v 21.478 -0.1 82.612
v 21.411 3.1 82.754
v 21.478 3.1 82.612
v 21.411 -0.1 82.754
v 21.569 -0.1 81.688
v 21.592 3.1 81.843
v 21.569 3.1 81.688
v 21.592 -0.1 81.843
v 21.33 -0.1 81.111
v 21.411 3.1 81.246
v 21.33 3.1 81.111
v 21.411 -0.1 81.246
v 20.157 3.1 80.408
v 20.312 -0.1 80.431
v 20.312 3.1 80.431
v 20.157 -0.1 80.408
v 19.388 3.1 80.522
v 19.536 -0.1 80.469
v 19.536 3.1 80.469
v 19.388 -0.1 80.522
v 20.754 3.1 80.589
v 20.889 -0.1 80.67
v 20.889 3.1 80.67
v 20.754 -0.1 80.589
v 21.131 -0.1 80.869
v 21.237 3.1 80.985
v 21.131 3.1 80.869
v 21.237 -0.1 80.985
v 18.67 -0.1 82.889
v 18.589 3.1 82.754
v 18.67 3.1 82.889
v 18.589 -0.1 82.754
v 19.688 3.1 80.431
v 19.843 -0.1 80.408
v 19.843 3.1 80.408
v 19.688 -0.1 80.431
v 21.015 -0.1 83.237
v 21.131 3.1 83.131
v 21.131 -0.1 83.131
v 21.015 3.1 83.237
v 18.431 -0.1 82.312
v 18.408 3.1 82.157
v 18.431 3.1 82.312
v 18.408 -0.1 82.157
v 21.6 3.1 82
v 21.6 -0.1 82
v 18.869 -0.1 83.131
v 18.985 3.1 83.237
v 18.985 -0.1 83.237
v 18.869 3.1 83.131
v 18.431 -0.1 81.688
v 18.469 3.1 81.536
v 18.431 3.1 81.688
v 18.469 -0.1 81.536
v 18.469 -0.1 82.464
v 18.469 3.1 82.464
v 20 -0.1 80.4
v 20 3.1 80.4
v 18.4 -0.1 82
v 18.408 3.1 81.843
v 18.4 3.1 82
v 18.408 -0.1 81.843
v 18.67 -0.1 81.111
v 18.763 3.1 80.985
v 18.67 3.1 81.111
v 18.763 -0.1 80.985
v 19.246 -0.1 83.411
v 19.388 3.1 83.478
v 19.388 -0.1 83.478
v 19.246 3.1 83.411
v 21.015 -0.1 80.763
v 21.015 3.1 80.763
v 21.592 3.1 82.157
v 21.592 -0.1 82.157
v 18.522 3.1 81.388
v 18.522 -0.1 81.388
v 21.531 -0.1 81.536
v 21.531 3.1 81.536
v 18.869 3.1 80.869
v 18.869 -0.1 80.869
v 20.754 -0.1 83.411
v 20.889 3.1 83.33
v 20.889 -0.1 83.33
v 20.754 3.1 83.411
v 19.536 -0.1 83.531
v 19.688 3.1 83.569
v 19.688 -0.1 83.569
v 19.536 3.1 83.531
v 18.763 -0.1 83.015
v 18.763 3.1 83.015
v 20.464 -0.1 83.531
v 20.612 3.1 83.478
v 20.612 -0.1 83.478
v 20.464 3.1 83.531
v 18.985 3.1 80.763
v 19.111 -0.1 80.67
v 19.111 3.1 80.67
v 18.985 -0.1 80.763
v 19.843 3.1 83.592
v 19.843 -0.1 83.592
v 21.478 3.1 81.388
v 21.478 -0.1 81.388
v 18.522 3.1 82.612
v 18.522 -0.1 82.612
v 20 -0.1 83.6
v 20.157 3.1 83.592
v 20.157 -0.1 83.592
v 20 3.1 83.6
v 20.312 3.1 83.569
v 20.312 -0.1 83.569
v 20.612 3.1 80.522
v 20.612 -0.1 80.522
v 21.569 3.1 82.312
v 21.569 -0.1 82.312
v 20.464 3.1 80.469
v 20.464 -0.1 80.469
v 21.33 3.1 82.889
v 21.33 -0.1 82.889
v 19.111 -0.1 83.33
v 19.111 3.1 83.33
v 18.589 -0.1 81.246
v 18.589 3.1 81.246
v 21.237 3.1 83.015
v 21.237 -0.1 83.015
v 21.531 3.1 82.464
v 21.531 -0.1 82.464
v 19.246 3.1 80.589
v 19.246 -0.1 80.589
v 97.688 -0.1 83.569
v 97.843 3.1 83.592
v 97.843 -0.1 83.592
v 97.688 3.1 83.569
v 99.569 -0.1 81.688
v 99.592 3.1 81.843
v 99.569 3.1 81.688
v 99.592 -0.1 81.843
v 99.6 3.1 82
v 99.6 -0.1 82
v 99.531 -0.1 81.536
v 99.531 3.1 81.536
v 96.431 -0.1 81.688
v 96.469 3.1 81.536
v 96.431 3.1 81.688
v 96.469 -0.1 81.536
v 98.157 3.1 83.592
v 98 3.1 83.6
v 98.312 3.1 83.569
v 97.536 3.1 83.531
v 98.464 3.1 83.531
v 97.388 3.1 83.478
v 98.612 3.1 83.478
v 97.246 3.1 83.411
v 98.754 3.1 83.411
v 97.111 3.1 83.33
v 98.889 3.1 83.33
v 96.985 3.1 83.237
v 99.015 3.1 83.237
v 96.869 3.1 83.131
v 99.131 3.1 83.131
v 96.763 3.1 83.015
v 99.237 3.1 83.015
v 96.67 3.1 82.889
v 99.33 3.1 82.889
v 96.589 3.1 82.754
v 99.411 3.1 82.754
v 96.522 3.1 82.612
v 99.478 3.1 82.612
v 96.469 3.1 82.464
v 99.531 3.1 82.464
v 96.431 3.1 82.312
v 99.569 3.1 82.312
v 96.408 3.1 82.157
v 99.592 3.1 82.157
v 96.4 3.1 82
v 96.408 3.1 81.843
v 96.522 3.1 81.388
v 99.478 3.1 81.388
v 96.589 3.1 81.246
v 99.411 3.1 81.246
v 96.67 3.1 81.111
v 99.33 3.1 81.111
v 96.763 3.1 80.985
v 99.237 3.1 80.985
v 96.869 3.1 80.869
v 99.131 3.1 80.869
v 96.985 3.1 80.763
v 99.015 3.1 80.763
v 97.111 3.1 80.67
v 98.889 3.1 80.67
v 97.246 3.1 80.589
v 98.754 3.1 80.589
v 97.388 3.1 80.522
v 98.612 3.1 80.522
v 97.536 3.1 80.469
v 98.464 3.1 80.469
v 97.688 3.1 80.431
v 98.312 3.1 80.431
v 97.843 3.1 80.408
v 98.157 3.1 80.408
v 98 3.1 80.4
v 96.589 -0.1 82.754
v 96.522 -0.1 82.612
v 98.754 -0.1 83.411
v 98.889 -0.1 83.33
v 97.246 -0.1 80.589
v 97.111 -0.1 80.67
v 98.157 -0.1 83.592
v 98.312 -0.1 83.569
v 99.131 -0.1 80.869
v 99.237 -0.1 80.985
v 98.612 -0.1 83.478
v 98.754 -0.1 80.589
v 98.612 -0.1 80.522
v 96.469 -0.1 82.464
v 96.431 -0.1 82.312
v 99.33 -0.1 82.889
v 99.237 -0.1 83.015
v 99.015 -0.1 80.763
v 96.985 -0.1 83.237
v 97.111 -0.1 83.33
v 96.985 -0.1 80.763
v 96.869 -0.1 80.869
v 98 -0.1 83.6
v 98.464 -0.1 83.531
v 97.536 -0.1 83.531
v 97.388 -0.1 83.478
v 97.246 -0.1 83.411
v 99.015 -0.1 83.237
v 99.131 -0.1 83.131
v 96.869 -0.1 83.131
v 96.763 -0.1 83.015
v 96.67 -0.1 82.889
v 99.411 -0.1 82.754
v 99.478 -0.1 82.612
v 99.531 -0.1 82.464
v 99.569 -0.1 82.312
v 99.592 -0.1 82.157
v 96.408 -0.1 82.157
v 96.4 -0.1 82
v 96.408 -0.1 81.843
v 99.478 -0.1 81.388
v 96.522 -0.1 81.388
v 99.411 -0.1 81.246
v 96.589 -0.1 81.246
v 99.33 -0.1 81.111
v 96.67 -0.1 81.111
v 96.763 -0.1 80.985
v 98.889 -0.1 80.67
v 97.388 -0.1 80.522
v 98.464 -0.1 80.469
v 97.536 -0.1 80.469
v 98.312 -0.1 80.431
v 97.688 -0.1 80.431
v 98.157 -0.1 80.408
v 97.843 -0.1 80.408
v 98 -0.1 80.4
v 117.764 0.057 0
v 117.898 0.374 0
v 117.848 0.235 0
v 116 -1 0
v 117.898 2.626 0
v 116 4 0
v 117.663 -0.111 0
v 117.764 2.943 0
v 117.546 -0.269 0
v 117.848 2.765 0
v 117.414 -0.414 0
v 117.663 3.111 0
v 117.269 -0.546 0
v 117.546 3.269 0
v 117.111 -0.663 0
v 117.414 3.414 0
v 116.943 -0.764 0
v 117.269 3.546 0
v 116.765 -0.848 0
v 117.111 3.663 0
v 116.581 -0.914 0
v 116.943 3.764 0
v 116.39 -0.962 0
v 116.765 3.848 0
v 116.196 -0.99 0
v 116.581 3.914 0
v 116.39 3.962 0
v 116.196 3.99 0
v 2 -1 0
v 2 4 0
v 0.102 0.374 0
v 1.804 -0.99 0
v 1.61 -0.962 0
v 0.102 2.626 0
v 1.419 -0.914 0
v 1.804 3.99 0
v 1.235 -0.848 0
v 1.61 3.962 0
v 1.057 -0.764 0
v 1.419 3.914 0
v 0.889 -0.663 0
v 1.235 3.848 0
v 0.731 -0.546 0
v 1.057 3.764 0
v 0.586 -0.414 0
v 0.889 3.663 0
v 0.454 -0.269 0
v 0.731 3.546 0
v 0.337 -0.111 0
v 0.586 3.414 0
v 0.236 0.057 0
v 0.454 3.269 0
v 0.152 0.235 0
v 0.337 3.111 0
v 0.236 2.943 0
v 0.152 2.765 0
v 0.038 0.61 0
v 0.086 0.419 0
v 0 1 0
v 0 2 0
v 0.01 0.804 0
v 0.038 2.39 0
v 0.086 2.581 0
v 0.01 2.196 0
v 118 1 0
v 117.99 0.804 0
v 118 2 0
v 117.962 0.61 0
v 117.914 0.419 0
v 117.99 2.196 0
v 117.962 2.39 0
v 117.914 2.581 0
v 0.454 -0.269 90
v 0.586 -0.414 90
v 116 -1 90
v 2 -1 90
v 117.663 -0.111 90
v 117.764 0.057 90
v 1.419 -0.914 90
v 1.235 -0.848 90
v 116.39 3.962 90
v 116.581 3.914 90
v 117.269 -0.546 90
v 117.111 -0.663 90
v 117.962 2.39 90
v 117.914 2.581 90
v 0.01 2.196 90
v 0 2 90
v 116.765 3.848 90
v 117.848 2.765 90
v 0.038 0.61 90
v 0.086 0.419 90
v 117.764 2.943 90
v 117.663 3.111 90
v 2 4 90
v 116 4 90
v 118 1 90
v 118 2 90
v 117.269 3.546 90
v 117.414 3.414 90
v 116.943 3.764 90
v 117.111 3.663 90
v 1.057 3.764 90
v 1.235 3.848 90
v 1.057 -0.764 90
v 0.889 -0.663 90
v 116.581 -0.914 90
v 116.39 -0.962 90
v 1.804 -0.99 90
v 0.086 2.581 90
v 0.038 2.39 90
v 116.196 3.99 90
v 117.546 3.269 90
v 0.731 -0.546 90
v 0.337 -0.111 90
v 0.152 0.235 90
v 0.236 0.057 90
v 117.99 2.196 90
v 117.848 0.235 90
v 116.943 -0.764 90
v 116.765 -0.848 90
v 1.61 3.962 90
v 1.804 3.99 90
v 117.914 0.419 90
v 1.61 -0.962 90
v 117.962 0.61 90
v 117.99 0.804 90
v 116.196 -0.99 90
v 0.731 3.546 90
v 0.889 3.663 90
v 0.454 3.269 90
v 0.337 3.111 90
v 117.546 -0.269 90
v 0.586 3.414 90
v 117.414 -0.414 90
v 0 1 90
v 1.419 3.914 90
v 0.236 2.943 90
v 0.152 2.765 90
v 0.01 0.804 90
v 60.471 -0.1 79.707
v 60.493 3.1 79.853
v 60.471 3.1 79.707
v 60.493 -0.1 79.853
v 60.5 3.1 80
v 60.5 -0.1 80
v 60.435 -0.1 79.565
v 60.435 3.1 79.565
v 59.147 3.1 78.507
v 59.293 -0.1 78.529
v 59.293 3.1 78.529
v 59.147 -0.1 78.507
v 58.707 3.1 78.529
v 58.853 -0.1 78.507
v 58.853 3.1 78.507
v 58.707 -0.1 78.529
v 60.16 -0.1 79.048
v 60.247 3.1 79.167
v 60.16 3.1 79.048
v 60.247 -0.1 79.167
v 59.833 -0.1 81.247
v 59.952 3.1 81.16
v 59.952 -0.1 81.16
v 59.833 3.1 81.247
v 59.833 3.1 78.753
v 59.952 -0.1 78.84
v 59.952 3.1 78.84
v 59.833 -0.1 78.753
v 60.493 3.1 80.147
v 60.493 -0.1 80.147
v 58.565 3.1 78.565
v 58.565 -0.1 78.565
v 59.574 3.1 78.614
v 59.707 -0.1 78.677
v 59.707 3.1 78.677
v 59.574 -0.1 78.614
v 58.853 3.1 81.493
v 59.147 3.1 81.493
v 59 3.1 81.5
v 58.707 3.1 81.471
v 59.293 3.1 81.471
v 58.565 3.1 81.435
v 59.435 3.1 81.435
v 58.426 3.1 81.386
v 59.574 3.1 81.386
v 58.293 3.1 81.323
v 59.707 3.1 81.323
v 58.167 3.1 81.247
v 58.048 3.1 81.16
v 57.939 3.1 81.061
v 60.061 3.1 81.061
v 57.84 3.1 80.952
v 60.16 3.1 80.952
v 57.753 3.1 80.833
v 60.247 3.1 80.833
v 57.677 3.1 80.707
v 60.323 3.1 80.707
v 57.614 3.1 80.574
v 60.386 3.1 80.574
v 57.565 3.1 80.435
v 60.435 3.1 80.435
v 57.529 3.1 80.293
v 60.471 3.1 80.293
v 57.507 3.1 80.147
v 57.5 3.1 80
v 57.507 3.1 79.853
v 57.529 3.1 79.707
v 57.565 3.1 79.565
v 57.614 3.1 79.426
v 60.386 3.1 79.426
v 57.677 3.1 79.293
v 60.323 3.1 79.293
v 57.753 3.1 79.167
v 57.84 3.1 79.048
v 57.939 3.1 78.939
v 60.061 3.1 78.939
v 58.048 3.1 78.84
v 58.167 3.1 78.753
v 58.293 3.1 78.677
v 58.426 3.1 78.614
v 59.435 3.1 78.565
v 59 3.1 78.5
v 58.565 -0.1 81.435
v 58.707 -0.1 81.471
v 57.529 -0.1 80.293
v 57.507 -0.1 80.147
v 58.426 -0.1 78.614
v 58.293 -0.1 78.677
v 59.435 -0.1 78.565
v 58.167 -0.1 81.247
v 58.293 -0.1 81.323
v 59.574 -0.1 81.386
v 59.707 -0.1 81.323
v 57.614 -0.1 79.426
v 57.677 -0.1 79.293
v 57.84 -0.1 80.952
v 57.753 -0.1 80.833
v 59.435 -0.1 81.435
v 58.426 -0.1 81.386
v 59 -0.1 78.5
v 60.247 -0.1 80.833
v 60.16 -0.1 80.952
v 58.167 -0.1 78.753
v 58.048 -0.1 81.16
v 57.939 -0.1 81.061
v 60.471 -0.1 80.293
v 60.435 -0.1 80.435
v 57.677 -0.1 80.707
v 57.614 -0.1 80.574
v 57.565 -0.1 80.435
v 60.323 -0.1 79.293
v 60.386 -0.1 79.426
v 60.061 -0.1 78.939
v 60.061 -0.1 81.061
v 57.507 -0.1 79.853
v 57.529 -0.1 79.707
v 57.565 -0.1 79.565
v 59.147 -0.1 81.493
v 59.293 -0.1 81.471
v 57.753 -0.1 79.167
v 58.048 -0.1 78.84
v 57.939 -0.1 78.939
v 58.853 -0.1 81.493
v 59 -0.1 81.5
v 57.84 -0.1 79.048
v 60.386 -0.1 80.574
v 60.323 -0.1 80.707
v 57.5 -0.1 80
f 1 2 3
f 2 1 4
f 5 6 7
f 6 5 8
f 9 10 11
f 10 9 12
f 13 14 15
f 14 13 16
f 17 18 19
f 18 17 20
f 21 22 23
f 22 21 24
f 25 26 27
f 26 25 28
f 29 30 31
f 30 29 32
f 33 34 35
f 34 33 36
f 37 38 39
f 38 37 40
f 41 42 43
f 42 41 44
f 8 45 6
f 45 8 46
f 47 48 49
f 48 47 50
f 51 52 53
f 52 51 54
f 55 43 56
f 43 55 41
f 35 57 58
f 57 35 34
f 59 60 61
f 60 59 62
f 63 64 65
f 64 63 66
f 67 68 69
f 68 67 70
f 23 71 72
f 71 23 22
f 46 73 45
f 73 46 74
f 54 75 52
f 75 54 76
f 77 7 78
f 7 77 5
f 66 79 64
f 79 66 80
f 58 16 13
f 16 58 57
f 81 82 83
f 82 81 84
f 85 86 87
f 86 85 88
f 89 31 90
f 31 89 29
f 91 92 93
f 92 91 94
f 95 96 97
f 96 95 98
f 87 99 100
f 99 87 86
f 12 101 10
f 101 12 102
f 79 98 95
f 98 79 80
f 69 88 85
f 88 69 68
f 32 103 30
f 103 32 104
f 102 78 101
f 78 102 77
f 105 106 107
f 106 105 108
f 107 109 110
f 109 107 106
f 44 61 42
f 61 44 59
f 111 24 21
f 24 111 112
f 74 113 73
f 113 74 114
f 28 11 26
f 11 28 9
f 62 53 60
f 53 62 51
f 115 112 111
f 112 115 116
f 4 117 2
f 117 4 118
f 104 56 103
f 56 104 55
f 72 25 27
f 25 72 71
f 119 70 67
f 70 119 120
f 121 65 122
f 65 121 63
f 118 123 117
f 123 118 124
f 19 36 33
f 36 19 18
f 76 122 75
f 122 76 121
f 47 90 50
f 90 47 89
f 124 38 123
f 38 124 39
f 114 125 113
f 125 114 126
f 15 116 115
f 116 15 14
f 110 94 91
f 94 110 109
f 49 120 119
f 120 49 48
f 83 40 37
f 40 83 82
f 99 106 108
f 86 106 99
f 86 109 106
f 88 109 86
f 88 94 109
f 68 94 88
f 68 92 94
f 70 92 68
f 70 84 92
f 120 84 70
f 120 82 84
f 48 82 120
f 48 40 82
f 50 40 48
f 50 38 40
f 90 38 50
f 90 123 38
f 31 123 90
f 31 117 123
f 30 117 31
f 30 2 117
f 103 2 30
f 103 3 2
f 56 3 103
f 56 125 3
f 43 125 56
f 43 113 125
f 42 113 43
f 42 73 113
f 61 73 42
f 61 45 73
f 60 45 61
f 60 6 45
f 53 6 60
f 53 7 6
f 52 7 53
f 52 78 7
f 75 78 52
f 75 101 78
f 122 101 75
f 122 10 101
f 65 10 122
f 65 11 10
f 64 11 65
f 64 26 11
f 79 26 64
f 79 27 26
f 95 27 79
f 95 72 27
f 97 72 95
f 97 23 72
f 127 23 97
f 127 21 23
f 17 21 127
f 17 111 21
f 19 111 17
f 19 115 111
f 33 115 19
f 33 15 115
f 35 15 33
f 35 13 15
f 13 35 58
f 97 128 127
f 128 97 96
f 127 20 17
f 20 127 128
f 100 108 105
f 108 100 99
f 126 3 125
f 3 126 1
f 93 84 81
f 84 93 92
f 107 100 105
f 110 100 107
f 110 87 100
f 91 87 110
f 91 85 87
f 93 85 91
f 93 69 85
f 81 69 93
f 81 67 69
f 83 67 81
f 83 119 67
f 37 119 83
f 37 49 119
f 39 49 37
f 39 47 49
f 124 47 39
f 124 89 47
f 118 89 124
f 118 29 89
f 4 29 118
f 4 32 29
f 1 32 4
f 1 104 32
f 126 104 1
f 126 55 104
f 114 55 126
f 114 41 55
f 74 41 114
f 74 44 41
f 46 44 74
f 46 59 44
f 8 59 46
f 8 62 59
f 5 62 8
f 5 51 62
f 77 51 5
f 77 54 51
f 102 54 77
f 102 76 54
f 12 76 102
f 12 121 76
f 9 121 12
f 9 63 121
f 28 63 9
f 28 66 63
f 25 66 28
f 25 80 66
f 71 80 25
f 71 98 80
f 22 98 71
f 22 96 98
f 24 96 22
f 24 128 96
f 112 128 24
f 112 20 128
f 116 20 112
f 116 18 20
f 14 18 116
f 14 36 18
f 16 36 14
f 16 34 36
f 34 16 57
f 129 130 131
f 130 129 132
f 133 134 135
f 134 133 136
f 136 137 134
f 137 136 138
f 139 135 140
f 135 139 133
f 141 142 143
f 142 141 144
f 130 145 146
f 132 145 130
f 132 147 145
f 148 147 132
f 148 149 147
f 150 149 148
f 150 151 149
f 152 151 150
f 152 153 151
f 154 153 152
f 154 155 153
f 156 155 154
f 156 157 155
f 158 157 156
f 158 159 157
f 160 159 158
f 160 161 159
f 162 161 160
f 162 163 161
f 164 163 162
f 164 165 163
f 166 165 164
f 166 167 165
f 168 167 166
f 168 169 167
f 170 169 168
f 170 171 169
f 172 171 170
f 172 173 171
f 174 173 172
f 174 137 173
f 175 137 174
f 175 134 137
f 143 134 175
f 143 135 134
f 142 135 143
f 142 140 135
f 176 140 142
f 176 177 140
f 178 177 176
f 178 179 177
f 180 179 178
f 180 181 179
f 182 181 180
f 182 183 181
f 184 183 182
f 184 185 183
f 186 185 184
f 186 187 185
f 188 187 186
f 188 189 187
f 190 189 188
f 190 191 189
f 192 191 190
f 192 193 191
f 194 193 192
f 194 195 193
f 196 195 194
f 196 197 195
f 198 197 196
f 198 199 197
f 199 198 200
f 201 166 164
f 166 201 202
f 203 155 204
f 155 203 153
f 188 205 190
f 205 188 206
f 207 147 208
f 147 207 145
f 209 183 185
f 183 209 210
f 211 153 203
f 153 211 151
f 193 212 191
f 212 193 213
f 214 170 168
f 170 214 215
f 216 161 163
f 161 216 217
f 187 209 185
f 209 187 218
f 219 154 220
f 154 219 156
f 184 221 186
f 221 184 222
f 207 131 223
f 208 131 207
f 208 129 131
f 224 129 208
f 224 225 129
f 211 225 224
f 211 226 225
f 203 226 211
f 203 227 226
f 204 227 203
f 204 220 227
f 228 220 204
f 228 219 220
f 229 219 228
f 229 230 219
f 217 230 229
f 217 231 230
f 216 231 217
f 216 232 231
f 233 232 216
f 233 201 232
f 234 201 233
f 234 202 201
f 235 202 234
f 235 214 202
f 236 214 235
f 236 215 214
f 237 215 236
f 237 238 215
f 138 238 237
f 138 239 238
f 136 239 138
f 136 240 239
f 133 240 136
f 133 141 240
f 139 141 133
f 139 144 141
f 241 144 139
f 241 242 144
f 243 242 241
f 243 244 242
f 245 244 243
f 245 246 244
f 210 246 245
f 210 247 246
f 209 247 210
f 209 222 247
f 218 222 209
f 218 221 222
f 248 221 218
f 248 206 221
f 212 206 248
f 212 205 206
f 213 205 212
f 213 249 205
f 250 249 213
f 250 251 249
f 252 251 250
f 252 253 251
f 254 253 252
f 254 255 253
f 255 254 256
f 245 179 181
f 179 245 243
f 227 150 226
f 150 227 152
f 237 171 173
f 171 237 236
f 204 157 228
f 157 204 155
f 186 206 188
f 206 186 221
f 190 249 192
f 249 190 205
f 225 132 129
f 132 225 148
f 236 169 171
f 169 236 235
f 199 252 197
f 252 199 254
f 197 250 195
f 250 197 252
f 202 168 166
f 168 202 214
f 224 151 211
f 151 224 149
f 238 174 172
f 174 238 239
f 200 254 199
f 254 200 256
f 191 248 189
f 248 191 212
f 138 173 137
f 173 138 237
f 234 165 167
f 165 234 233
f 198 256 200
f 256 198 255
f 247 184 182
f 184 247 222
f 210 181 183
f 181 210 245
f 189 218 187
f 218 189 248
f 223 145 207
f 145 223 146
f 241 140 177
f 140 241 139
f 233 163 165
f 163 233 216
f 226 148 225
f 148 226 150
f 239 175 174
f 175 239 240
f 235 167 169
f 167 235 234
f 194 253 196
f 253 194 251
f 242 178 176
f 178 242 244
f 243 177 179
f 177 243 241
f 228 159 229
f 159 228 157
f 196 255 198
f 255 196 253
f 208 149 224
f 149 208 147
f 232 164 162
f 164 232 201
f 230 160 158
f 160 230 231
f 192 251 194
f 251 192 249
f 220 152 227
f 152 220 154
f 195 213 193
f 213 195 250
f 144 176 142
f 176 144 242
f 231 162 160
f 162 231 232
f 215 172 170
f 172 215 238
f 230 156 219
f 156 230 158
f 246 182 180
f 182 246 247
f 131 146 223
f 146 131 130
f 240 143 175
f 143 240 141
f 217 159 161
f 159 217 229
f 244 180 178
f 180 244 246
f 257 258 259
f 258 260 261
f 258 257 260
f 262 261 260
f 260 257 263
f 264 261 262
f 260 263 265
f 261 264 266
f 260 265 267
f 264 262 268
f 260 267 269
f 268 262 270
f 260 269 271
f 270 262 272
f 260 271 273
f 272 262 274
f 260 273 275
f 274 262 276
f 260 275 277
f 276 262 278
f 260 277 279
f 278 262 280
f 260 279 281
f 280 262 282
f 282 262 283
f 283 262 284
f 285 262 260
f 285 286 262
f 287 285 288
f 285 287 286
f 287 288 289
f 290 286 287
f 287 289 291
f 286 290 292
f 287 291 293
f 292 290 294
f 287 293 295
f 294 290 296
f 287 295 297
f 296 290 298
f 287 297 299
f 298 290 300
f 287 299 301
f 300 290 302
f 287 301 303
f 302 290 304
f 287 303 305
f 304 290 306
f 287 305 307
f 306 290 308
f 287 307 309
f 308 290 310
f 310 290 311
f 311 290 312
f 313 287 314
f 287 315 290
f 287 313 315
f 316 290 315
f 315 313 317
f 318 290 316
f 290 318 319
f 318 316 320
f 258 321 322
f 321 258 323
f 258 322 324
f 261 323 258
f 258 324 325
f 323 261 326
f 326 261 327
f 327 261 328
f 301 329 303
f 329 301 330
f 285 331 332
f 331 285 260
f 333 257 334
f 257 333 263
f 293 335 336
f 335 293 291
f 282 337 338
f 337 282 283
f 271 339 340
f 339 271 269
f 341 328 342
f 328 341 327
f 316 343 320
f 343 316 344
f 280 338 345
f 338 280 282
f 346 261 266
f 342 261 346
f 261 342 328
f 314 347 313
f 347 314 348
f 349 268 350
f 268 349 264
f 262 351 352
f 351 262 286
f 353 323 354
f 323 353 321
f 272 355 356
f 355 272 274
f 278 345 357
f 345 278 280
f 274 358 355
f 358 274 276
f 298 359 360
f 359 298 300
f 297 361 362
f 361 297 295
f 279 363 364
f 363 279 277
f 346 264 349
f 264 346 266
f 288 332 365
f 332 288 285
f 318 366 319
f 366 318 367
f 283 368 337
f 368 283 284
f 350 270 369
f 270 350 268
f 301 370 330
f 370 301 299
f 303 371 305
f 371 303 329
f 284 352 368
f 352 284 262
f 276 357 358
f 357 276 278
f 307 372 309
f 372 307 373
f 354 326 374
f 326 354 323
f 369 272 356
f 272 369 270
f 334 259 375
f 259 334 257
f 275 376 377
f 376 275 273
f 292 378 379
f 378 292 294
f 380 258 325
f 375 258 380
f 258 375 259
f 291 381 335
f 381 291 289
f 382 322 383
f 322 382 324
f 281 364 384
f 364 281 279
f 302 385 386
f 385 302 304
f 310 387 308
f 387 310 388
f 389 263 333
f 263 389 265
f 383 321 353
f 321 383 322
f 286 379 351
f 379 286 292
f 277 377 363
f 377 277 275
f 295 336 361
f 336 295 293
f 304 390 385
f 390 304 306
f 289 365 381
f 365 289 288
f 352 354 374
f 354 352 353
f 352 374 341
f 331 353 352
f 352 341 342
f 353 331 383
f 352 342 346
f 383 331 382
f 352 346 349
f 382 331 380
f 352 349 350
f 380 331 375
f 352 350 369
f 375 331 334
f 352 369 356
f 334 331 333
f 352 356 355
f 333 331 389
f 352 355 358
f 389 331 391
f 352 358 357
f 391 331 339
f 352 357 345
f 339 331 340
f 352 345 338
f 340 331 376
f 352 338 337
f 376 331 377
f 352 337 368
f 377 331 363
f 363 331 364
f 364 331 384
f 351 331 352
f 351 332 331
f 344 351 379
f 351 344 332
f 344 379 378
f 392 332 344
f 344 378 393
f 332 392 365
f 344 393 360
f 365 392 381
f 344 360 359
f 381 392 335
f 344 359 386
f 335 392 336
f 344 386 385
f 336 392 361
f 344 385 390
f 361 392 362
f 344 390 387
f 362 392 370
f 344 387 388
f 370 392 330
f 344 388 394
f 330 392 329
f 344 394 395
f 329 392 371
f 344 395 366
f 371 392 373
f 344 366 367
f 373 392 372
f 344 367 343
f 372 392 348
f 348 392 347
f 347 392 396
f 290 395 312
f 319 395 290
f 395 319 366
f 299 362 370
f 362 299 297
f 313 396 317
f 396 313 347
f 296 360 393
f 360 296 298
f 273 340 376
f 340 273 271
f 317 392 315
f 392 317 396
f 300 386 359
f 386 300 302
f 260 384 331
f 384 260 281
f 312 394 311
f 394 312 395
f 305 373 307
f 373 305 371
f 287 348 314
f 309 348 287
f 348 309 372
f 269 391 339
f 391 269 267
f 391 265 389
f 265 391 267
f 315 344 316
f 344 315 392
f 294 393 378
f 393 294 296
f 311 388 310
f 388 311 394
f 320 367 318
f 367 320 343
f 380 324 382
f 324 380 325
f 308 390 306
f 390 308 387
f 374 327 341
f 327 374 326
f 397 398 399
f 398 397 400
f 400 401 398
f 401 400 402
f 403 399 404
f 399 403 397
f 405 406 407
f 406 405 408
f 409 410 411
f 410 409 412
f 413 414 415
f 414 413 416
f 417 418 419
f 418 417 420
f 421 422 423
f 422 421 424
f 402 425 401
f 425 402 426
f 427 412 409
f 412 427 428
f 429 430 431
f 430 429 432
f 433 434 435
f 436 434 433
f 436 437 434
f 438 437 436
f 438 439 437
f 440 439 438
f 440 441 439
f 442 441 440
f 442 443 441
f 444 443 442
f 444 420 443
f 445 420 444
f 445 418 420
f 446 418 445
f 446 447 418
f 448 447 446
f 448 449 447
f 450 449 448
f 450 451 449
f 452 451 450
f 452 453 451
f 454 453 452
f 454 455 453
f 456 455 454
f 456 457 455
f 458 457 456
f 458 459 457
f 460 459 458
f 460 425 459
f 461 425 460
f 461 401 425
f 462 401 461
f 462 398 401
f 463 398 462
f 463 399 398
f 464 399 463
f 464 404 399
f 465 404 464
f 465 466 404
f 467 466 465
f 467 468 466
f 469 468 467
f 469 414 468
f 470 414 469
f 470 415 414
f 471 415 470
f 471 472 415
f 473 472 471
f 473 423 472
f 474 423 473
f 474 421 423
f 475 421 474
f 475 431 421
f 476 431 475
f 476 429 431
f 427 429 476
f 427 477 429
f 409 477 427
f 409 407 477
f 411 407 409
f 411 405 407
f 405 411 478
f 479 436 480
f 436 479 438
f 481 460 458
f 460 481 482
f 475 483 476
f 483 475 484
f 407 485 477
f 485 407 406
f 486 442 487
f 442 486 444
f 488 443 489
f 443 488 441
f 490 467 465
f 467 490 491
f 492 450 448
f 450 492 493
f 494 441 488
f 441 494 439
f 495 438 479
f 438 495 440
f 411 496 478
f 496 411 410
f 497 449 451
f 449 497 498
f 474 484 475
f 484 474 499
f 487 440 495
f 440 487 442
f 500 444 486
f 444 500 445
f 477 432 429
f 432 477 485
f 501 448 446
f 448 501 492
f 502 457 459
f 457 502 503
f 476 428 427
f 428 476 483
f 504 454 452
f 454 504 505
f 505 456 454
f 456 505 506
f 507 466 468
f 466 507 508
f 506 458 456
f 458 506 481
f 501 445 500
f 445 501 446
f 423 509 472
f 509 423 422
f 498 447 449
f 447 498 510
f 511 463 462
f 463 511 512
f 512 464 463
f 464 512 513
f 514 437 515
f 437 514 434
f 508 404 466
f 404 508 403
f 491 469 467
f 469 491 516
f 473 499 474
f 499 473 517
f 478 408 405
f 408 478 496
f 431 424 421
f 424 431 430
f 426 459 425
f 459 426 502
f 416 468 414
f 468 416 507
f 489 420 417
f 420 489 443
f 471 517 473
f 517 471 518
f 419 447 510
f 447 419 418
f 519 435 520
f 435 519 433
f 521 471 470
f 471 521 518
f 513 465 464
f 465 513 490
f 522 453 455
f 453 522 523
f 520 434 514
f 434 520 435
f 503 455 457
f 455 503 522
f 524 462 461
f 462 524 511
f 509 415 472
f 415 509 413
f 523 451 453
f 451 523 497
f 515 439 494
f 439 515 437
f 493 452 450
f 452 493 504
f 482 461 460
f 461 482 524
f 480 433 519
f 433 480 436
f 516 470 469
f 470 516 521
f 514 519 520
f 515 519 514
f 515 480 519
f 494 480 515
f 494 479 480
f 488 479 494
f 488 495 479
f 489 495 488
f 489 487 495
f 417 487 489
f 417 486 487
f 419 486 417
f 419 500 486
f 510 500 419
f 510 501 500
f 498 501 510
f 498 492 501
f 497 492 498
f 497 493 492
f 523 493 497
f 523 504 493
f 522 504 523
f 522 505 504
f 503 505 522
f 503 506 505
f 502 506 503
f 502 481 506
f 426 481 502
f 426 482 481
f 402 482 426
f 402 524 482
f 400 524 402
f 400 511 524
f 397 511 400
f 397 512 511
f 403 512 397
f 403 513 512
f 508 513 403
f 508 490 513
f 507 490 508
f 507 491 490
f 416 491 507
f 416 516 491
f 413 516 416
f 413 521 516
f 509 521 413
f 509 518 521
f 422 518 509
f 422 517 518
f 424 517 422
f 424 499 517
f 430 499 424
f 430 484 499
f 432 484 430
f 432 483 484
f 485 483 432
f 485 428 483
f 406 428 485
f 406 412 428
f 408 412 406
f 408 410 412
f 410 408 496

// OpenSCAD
// file: params.scad
// Cat Feeder 5000 — Shared Parameters & Common Modules
// Include this file first in all part files: include <params.scad>

// ===== DIMENSIONS =====
WALL = 3;                // Standard wall thickness (mm)
THIN_WALL = 2.5;         // Thin walls (antenna arch, etc.)
FLOOR = 4;               // Base floor thickness
INSERT_BORE = 4.7;       // M3 heat-set insert pocket bore
M3_CLEAR = 3.4;          // M3 clearance hole
UNIT_W = 160;            // Main body width
UNIT_D = 240;            // Main body depth
UNIT_H = 160;            // Main body height
GATE_W = 118;            // Gate flap width
GATE_H = 90;             // Gate flap height
GATE_T = 3;              // Gate flap thickness
GATE_ROD_D = 3.2;        // Gate hinge rod diameter
ARCH_SPAN = 160;         // Antenna arch left-to-right span
ARCH_H = 70;             // Antenna arch height
ARCH_D = 40;             // Antenna arch depth (front-to-back)
COIL_CH_W = 16;          // Coil channel width
COIL_CH_D = 5;           // Coil channel depth
SERVO_W = 23;            // SG90 servo width
SERVO_D = 12.5;          // SG90 servo depth
SERVO_H = 30;            // SG90 servo height
SERVO_EAR_SPAN = 28;     // SG90 servo ear spacing
TOLERANCE = 0.1;         // General fit tolerance

// ===== RENDER QUALITY =====
$fn = 64;                // Circle resolution (smooth curves)

// ===== COLORS =====
COL_RFID = [0.8, 0.2, 0.2, 0.8];      // Red — RFID antenna arch
COL_TPU = [0.4, 0.7, 0.3, 0.8];       // Green — TPU flexible parts
COL_GATE = [0.2, 0.5, 0.8, 0.8];      // Blue — Gate mechanism
COL_BODY = [0.6, 0.6, 0.6, 0.8];      // Gray — Main body structure

// ===== COMMON MODULES =====

// M3 heat-set insert pocket (bore hole for pressed insert)
module m3_insert(h = 8) {
    cylinder(d = INSERT_BORE, h = h);
}

// M3 clearance hole (for bolt pass-through)
module m3_clear(h = 8) {
    cylinder(d = M3_CLEAR, h = h);
}

// Fillet box: rectangular box with filleted corners
// w, d, h = width, depth, height; r = corner radius
module fillet_box(w, d, h, r = 2) {
    hull() {
        translate([r, r, 0])
            cylinder(r = r, h = h);
        translate([w - r, r, 0])
            cylinder(r = r, h = h);
        translate([r, d - r, 0])
            cylinder(r = r, h = h);
        translate([w - r, d - r, 0])
            cylinder(r = r, h = h);
    }
}

// Boss: raised circular pad with M3 pocket
// Useful for internal reinforcement at bolt points
module boss(d = 10, h = 4, pocket = true) {
    difference() {
        cylinder(d = d, h = h);
        if (pocket)
            translate([0, 0, -0.1])
                m3_clear(h = h + 0.2);
    }
}
// main file
// Cat Feeder 5000 — Part 13: Bowl Gate Flap (Swing-Up)
// Hinged at top, swings up into feeder body when open. Servo-actuated.
// CRITICAL: Swings UPWARD — cat's head/back cannot contact it.
// Print: PETG, 0.15mm layers, 40% infill, no supports. Print flat (face down).

include <params.scad>

color(COL_GATE) gate_flap();

module gate_flap() {
    GW = GATE_W;    // 118mm
    GH = GATE_H;    // 90mm
    GT = GATE_T;    // 3mm

    difference() {
        // Main flap body
        fillet_box(GW, GT, GH, r=2);

        // Hinge rod holes (×2, top edge, 3.2mm dia)
        for (x = [20, GW - 20])
            translate([x, -0.1, GH - 8])
                rotate([-90, 0, 0])
                    cylinder(d=GATE_ROD_D, h=GT + 0.2);

        // Servo linkage hole (top center, Ø3mm)
        translate([GW/2, -0.1, GH - 10])
            rotate([-90, 0, 0])
                cylinder(d=3, h=GT + 0.2);

        // Bottom edge chamfer (R5, cat-facing side — no sharp edge)
        translate([0, -0.1, 0])
            rotate([-90, 0, 0])
                difference() {
                    cube([GW, 6, GT + 0.2]);
                    translate([0, 0, 0]) fillet_box(GW, 6, GT + 0.2, r=5);
                }
    }
}
